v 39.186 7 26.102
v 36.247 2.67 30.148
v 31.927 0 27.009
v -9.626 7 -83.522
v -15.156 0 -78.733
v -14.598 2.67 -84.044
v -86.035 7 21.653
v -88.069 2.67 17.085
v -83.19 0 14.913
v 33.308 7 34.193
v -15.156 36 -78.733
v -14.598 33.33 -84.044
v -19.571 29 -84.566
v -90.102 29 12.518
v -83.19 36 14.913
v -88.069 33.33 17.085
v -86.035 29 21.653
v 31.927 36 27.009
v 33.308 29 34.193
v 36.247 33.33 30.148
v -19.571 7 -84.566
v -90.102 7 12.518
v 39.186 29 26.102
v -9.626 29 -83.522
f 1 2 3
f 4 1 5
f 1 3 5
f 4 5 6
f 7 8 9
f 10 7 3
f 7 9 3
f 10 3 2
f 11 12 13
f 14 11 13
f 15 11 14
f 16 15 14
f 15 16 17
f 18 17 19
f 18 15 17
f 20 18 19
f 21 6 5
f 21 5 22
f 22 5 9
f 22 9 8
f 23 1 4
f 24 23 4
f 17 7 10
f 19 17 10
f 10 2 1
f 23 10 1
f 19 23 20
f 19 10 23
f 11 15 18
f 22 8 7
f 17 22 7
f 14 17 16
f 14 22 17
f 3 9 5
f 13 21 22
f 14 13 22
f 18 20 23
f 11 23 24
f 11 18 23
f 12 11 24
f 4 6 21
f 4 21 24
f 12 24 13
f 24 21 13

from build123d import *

# Parameters (mm, degrees)
BOSS_EXTRU_1_DEPTH = 36
CHANFREIN1_SIZE    = 7
CHANFREIN2_SIZE    = 10


with BuildPart() as part:
    # Esquisse1 → Boss.-Extru.1 (new body)
    with BuildSketch(Plane(origin=(0, 0, 0), x_dir=(1, 0, 0), z_dir=(0, 1, 0))):
        Polygon((43.253574696, -35.237781767), (-13.693473115, 92.656837923), (-95.979938868, -20.608061997), align=None)
    extrude(amount=BOSS_EXTRU_1_DEPTH)

    # Chanfrein1
    chanfrein1_edges = [part.edges().sort_by_distance(p)[0] for p in [
        (-54.836705991, 36, -36.024387963),
        (-54.836705991, 0, -36.024387963),
        (-26.363182086, 36, 27.922921882),
        (14.780050791, 0, -28.709528078),
        (-26.363182086, 0, 27.922921882),
        (14.780050791, 36, -28.709528078),
    ]]
    chamfer(chanfrein1_edges, length=CHANFREIN1_SIZE)

    # Chanfrein2
    chanfrein2_edges = [part.edges().sort_by_distance(p)[0] for p in [
        (-13.693473115, 18, -92.656837923),
        (43.253574696, 18, 35.237781767),
        (-95.979938868, 18, 20.608061997),
    ]]
    chamfer(chanfrein2_edges, length=CHANFREIN2_SIZE)


solid = part.part
